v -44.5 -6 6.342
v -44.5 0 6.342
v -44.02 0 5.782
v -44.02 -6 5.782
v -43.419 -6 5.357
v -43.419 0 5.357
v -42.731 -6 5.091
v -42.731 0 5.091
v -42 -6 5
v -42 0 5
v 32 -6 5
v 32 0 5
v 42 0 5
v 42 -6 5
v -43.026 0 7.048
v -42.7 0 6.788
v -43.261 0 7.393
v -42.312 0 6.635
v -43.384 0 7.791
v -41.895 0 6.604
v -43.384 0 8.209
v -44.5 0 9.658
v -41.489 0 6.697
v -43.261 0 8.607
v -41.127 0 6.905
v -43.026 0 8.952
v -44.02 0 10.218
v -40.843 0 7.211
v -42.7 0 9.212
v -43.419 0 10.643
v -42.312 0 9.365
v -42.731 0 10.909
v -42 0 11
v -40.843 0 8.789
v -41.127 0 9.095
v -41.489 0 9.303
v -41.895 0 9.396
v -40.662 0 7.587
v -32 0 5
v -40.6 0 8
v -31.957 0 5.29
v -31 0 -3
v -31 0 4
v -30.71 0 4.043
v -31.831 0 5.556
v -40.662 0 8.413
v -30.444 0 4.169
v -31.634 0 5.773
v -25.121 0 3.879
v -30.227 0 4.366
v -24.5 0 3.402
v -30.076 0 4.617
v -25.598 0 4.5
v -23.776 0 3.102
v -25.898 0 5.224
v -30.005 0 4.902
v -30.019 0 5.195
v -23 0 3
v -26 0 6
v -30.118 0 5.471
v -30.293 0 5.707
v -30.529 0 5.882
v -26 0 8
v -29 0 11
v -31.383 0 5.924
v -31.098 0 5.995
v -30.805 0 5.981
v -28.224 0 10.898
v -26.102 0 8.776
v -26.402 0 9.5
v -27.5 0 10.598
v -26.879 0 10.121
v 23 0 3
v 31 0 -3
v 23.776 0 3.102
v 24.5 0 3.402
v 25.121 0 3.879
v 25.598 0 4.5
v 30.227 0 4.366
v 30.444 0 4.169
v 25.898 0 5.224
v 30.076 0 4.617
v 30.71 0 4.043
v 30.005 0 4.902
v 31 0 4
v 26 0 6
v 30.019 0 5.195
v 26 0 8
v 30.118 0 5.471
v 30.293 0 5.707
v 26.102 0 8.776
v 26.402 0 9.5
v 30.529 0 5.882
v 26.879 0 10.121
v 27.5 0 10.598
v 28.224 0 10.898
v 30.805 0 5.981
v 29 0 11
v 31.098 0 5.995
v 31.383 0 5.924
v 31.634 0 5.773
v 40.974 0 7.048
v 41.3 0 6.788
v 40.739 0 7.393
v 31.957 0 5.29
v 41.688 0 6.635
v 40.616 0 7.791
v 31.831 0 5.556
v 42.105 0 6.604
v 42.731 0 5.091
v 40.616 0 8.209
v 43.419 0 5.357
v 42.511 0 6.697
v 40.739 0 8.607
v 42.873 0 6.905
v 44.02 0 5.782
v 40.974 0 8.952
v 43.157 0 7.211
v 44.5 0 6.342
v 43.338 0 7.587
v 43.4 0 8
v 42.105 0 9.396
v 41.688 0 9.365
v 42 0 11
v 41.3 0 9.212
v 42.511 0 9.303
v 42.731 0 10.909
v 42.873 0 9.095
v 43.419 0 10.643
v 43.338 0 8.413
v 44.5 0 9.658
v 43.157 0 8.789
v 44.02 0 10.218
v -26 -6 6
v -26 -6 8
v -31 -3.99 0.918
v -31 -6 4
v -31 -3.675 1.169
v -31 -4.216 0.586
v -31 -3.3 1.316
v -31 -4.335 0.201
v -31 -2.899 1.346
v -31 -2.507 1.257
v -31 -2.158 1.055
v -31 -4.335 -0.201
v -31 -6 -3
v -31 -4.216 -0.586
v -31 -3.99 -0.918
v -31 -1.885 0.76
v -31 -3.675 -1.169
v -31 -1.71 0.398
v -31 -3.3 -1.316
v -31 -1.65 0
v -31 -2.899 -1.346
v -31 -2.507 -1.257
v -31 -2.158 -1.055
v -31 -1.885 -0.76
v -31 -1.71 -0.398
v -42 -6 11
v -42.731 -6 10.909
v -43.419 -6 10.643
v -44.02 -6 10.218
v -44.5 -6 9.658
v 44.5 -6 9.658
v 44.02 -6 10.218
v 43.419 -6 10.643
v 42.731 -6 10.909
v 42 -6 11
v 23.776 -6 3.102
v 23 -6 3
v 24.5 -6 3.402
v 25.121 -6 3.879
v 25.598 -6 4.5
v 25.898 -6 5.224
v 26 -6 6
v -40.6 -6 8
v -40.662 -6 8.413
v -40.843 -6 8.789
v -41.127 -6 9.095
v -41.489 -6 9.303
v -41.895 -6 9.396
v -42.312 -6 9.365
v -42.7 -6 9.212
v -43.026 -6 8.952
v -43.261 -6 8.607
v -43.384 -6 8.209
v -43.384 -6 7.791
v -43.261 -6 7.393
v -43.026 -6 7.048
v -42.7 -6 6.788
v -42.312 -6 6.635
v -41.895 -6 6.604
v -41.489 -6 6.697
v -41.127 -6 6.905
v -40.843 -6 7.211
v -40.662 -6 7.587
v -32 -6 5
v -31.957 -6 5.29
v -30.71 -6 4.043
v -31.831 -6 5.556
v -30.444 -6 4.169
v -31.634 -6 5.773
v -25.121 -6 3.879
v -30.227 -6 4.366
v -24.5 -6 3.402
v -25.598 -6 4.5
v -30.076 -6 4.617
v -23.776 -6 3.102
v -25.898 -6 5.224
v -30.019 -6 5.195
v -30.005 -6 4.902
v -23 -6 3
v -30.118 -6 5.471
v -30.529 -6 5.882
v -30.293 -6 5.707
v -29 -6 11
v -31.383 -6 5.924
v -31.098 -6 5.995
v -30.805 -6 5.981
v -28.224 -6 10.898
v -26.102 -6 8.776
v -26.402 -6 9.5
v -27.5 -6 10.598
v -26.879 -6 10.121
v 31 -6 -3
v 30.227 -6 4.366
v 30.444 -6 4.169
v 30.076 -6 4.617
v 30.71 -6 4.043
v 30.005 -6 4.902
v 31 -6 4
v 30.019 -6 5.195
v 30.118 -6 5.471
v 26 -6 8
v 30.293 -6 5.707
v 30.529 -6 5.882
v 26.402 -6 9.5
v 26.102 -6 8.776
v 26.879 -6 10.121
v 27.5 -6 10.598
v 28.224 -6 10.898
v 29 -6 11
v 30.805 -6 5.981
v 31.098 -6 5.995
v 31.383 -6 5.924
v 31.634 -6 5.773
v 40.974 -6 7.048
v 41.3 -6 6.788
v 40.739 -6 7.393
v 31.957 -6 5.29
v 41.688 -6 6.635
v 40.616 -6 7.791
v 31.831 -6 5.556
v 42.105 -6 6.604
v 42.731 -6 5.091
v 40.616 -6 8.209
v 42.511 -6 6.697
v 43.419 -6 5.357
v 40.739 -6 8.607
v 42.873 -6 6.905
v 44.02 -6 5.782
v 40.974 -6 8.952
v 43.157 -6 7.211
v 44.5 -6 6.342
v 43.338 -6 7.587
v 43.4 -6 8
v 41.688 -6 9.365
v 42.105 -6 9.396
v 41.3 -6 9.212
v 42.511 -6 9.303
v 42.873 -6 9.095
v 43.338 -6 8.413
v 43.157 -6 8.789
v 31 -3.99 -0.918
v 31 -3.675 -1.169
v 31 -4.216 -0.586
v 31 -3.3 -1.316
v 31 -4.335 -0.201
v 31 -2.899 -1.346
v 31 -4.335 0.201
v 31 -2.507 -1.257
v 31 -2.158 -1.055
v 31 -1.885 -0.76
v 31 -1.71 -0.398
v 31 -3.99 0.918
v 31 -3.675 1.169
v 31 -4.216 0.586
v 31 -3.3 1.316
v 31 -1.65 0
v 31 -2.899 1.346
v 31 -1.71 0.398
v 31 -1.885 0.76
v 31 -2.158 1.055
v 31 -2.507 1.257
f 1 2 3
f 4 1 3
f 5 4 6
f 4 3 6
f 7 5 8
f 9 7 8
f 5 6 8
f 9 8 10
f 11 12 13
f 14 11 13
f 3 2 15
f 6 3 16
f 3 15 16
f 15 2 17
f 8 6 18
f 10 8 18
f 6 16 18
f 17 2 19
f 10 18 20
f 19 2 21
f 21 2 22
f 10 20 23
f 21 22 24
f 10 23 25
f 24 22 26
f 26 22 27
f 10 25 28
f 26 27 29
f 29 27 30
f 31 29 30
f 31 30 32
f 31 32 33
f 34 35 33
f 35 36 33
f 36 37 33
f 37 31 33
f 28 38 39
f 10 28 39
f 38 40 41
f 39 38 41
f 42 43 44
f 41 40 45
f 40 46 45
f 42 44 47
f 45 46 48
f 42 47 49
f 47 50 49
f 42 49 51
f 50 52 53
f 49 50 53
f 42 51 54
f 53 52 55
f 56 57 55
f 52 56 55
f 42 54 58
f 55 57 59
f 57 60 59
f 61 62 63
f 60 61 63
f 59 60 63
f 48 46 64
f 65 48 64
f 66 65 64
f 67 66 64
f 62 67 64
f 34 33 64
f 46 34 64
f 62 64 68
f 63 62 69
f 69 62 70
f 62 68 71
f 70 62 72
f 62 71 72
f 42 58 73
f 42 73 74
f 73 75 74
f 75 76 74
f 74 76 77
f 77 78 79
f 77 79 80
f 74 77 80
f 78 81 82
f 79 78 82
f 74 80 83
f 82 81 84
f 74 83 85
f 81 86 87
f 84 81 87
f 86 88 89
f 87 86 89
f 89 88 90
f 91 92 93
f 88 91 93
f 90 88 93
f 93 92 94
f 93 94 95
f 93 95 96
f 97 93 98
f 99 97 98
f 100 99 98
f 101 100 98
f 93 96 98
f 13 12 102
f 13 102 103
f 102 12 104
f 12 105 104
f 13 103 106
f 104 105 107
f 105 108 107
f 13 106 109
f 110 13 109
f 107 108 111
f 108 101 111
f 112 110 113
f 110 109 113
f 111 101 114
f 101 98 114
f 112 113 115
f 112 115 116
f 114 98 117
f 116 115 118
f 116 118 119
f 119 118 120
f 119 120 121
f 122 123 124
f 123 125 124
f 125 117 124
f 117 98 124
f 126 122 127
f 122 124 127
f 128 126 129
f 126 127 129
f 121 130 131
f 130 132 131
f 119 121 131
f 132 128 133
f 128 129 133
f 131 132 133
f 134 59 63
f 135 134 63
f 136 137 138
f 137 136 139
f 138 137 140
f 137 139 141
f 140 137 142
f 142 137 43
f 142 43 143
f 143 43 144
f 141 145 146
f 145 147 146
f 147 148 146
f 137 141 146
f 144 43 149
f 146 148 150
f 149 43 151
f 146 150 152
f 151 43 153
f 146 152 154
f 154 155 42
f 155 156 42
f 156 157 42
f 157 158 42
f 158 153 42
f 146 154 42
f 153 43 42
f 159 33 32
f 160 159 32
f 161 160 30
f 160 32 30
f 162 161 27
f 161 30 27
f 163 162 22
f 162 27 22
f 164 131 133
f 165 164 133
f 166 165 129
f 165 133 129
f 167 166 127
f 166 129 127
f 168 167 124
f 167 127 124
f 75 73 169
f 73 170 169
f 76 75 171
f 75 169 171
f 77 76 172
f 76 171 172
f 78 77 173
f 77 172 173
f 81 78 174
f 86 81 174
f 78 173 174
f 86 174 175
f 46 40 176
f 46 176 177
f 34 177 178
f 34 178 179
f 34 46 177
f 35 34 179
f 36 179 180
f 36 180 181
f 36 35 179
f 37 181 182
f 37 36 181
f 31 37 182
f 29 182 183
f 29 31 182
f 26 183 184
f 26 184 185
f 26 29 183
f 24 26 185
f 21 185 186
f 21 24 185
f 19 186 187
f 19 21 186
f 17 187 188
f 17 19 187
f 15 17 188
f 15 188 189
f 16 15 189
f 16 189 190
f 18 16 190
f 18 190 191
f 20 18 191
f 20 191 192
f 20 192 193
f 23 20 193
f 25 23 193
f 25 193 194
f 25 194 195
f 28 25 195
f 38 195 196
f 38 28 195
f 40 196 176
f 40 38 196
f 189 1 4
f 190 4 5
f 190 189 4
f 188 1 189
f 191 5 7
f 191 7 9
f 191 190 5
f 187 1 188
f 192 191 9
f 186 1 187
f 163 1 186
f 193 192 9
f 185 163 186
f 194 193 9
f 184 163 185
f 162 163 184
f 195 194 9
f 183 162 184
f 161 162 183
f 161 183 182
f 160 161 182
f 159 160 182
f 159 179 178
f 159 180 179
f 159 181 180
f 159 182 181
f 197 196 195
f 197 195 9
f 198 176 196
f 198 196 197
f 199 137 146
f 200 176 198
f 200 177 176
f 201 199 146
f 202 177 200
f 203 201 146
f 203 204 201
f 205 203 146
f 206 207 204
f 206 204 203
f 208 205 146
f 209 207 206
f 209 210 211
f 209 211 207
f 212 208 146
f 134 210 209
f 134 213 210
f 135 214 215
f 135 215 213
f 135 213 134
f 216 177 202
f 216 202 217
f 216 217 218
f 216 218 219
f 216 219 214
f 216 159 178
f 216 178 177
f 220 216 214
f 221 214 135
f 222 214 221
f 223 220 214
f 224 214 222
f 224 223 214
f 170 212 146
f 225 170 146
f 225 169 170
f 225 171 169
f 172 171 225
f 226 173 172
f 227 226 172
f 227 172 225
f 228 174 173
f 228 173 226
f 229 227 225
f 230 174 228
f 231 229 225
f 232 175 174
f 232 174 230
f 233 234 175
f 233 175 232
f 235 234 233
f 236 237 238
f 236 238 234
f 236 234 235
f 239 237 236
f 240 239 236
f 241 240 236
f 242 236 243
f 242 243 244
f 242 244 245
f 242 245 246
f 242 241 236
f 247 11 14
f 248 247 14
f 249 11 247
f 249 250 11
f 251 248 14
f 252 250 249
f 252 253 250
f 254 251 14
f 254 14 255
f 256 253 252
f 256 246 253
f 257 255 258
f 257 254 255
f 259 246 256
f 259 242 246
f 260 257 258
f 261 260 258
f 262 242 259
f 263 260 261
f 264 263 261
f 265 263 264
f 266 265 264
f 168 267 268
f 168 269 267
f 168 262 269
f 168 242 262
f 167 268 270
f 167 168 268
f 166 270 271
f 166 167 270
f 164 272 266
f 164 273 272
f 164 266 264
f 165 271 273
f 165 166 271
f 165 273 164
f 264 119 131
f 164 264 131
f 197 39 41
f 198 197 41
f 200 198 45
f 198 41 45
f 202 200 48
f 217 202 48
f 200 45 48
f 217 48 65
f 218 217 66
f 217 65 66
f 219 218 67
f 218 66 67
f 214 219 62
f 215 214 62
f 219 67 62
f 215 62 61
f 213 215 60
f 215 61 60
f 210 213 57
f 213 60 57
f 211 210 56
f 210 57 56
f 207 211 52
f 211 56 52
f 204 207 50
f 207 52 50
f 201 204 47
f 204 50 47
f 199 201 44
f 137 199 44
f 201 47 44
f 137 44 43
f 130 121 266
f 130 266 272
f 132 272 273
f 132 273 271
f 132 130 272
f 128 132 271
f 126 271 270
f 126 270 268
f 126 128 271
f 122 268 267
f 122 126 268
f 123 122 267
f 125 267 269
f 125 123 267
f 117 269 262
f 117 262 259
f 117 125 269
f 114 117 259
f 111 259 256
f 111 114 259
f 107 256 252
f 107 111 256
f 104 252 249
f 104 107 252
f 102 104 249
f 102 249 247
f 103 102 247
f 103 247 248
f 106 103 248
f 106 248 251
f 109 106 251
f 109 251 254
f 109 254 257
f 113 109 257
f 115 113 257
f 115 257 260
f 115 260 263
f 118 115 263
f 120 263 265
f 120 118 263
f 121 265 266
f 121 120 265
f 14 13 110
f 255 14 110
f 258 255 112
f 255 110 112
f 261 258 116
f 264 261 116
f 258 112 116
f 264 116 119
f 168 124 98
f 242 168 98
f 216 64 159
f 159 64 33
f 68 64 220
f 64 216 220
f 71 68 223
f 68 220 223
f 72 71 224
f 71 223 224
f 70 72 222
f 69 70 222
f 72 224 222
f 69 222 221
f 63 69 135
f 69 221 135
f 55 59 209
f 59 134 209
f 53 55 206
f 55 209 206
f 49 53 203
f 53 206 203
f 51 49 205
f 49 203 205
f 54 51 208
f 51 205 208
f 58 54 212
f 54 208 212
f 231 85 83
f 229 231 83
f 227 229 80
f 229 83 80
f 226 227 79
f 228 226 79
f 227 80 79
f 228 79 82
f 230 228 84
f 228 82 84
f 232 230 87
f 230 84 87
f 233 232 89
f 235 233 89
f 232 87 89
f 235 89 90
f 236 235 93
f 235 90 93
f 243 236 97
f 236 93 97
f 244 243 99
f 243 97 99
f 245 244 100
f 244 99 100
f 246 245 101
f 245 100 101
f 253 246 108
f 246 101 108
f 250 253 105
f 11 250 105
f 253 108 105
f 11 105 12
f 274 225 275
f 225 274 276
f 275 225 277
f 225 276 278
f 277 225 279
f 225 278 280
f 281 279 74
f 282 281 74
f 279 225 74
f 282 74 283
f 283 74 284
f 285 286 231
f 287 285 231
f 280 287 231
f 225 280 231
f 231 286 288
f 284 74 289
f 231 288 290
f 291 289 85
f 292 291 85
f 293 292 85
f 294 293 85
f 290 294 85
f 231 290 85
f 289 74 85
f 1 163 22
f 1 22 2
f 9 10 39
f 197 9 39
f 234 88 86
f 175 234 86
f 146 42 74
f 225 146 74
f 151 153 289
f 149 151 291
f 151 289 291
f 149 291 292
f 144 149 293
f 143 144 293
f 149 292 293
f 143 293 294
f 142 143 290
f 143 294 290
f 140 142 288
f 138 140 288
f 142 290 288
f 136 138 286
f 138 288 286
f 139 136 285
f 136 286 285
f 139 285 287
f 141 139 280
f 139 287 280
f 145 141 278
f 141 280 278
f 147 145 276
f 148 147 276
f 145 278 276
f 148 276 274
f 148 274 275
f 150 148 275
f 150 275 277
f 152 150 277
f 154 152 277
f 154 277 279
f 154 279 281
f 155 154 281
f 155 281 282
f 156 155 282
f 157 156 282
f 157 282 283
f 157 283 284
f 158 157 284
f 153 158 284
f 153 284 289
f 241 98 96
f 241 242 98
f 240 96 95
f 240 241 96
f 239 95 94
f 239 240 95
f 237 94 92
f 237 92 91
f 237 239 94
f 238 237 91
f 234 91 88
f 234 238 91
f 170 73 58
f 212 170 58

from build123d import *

# Parameters (mm, degrees)
F0_R     = 1.4
F1_DEPTH = 6
F2_R     = 3
F3_R     = 1.35
F4_DEPTH = 75.501


with BuildPart() as f1:
    # F0 (on Front) → F1 (new body)
    with BuildSketch(Plane.XZ):
        with BuildLine():
            Line((-31, 4), (-31, -3))
            Line((-31, -3), (31, -3))
            Line((31, -3), (31, 4))
            ThreePointArc((31, 4), (30.292893, 5.707107), (32, 5))
            Line((32, 5), (42, 5))
            ThreePointArc((42, 5), (43.418637, 5.356618), (44.5, 6.341688))
            Line((44.5, 6.341688), (44.5, 9.658312))
            ThreePointArc((44.5, 9.658312), (43.418637, 10.643382), (42, 11))
            Line((42, 11), (26, 11))
            Line((26, 11), (26, 5))
            Line((26, 5), (26, 3))
            Line((26, 3), (-26, 3))
            Line((-26, 3), (-26, 5))
            Line((-26, 5), (-26, 11))
            Line((-26, 11), (-42, 11))
            ThreePointArc((-42, 11), (-43.418637, 10.643382), (-44.5, 9.658312))
            Line((-44.5, 9.658312), (-44.5, 6.341688))
            ThreePointArc((-44.5, 6.341688), (-43.418637, 5.356618), (-42, 5))
            Line((-42, 5), (-32, 5))
            ThreePointArc((-32, 5), (-30.292893, 5.707107), (-31, 4))
        make_face()
        with Locations((-42, 8)):
            Circle(F0_R, mode=Mode.SUBTRACT)
        with Locations((42, 8)):
            Circle(F0_R, mode=Mode.SUBTRACT)
    extrude(amount=F1_DEPTH)

    # F2
    f2_edges = [f1.edges().sort_by_distance(p)[0] for p in [
        (-26, -3, 11),
        (26, -3, 11),
        (-26, -3, 3),
        (26, -3, 3),
    ]]
    fillet(f2_edges, radius=F2_R)

    # F3 (on face) → F4 (cut, through all)
    with BuildSketch(Plane.YZ.offset(31)):
        with Locations((-3, 0)):
            Circle(F3_R)
    extrude(amount=-F4_DEPTH, mode=Mode.SUBTRACT)


solid = f1.part
